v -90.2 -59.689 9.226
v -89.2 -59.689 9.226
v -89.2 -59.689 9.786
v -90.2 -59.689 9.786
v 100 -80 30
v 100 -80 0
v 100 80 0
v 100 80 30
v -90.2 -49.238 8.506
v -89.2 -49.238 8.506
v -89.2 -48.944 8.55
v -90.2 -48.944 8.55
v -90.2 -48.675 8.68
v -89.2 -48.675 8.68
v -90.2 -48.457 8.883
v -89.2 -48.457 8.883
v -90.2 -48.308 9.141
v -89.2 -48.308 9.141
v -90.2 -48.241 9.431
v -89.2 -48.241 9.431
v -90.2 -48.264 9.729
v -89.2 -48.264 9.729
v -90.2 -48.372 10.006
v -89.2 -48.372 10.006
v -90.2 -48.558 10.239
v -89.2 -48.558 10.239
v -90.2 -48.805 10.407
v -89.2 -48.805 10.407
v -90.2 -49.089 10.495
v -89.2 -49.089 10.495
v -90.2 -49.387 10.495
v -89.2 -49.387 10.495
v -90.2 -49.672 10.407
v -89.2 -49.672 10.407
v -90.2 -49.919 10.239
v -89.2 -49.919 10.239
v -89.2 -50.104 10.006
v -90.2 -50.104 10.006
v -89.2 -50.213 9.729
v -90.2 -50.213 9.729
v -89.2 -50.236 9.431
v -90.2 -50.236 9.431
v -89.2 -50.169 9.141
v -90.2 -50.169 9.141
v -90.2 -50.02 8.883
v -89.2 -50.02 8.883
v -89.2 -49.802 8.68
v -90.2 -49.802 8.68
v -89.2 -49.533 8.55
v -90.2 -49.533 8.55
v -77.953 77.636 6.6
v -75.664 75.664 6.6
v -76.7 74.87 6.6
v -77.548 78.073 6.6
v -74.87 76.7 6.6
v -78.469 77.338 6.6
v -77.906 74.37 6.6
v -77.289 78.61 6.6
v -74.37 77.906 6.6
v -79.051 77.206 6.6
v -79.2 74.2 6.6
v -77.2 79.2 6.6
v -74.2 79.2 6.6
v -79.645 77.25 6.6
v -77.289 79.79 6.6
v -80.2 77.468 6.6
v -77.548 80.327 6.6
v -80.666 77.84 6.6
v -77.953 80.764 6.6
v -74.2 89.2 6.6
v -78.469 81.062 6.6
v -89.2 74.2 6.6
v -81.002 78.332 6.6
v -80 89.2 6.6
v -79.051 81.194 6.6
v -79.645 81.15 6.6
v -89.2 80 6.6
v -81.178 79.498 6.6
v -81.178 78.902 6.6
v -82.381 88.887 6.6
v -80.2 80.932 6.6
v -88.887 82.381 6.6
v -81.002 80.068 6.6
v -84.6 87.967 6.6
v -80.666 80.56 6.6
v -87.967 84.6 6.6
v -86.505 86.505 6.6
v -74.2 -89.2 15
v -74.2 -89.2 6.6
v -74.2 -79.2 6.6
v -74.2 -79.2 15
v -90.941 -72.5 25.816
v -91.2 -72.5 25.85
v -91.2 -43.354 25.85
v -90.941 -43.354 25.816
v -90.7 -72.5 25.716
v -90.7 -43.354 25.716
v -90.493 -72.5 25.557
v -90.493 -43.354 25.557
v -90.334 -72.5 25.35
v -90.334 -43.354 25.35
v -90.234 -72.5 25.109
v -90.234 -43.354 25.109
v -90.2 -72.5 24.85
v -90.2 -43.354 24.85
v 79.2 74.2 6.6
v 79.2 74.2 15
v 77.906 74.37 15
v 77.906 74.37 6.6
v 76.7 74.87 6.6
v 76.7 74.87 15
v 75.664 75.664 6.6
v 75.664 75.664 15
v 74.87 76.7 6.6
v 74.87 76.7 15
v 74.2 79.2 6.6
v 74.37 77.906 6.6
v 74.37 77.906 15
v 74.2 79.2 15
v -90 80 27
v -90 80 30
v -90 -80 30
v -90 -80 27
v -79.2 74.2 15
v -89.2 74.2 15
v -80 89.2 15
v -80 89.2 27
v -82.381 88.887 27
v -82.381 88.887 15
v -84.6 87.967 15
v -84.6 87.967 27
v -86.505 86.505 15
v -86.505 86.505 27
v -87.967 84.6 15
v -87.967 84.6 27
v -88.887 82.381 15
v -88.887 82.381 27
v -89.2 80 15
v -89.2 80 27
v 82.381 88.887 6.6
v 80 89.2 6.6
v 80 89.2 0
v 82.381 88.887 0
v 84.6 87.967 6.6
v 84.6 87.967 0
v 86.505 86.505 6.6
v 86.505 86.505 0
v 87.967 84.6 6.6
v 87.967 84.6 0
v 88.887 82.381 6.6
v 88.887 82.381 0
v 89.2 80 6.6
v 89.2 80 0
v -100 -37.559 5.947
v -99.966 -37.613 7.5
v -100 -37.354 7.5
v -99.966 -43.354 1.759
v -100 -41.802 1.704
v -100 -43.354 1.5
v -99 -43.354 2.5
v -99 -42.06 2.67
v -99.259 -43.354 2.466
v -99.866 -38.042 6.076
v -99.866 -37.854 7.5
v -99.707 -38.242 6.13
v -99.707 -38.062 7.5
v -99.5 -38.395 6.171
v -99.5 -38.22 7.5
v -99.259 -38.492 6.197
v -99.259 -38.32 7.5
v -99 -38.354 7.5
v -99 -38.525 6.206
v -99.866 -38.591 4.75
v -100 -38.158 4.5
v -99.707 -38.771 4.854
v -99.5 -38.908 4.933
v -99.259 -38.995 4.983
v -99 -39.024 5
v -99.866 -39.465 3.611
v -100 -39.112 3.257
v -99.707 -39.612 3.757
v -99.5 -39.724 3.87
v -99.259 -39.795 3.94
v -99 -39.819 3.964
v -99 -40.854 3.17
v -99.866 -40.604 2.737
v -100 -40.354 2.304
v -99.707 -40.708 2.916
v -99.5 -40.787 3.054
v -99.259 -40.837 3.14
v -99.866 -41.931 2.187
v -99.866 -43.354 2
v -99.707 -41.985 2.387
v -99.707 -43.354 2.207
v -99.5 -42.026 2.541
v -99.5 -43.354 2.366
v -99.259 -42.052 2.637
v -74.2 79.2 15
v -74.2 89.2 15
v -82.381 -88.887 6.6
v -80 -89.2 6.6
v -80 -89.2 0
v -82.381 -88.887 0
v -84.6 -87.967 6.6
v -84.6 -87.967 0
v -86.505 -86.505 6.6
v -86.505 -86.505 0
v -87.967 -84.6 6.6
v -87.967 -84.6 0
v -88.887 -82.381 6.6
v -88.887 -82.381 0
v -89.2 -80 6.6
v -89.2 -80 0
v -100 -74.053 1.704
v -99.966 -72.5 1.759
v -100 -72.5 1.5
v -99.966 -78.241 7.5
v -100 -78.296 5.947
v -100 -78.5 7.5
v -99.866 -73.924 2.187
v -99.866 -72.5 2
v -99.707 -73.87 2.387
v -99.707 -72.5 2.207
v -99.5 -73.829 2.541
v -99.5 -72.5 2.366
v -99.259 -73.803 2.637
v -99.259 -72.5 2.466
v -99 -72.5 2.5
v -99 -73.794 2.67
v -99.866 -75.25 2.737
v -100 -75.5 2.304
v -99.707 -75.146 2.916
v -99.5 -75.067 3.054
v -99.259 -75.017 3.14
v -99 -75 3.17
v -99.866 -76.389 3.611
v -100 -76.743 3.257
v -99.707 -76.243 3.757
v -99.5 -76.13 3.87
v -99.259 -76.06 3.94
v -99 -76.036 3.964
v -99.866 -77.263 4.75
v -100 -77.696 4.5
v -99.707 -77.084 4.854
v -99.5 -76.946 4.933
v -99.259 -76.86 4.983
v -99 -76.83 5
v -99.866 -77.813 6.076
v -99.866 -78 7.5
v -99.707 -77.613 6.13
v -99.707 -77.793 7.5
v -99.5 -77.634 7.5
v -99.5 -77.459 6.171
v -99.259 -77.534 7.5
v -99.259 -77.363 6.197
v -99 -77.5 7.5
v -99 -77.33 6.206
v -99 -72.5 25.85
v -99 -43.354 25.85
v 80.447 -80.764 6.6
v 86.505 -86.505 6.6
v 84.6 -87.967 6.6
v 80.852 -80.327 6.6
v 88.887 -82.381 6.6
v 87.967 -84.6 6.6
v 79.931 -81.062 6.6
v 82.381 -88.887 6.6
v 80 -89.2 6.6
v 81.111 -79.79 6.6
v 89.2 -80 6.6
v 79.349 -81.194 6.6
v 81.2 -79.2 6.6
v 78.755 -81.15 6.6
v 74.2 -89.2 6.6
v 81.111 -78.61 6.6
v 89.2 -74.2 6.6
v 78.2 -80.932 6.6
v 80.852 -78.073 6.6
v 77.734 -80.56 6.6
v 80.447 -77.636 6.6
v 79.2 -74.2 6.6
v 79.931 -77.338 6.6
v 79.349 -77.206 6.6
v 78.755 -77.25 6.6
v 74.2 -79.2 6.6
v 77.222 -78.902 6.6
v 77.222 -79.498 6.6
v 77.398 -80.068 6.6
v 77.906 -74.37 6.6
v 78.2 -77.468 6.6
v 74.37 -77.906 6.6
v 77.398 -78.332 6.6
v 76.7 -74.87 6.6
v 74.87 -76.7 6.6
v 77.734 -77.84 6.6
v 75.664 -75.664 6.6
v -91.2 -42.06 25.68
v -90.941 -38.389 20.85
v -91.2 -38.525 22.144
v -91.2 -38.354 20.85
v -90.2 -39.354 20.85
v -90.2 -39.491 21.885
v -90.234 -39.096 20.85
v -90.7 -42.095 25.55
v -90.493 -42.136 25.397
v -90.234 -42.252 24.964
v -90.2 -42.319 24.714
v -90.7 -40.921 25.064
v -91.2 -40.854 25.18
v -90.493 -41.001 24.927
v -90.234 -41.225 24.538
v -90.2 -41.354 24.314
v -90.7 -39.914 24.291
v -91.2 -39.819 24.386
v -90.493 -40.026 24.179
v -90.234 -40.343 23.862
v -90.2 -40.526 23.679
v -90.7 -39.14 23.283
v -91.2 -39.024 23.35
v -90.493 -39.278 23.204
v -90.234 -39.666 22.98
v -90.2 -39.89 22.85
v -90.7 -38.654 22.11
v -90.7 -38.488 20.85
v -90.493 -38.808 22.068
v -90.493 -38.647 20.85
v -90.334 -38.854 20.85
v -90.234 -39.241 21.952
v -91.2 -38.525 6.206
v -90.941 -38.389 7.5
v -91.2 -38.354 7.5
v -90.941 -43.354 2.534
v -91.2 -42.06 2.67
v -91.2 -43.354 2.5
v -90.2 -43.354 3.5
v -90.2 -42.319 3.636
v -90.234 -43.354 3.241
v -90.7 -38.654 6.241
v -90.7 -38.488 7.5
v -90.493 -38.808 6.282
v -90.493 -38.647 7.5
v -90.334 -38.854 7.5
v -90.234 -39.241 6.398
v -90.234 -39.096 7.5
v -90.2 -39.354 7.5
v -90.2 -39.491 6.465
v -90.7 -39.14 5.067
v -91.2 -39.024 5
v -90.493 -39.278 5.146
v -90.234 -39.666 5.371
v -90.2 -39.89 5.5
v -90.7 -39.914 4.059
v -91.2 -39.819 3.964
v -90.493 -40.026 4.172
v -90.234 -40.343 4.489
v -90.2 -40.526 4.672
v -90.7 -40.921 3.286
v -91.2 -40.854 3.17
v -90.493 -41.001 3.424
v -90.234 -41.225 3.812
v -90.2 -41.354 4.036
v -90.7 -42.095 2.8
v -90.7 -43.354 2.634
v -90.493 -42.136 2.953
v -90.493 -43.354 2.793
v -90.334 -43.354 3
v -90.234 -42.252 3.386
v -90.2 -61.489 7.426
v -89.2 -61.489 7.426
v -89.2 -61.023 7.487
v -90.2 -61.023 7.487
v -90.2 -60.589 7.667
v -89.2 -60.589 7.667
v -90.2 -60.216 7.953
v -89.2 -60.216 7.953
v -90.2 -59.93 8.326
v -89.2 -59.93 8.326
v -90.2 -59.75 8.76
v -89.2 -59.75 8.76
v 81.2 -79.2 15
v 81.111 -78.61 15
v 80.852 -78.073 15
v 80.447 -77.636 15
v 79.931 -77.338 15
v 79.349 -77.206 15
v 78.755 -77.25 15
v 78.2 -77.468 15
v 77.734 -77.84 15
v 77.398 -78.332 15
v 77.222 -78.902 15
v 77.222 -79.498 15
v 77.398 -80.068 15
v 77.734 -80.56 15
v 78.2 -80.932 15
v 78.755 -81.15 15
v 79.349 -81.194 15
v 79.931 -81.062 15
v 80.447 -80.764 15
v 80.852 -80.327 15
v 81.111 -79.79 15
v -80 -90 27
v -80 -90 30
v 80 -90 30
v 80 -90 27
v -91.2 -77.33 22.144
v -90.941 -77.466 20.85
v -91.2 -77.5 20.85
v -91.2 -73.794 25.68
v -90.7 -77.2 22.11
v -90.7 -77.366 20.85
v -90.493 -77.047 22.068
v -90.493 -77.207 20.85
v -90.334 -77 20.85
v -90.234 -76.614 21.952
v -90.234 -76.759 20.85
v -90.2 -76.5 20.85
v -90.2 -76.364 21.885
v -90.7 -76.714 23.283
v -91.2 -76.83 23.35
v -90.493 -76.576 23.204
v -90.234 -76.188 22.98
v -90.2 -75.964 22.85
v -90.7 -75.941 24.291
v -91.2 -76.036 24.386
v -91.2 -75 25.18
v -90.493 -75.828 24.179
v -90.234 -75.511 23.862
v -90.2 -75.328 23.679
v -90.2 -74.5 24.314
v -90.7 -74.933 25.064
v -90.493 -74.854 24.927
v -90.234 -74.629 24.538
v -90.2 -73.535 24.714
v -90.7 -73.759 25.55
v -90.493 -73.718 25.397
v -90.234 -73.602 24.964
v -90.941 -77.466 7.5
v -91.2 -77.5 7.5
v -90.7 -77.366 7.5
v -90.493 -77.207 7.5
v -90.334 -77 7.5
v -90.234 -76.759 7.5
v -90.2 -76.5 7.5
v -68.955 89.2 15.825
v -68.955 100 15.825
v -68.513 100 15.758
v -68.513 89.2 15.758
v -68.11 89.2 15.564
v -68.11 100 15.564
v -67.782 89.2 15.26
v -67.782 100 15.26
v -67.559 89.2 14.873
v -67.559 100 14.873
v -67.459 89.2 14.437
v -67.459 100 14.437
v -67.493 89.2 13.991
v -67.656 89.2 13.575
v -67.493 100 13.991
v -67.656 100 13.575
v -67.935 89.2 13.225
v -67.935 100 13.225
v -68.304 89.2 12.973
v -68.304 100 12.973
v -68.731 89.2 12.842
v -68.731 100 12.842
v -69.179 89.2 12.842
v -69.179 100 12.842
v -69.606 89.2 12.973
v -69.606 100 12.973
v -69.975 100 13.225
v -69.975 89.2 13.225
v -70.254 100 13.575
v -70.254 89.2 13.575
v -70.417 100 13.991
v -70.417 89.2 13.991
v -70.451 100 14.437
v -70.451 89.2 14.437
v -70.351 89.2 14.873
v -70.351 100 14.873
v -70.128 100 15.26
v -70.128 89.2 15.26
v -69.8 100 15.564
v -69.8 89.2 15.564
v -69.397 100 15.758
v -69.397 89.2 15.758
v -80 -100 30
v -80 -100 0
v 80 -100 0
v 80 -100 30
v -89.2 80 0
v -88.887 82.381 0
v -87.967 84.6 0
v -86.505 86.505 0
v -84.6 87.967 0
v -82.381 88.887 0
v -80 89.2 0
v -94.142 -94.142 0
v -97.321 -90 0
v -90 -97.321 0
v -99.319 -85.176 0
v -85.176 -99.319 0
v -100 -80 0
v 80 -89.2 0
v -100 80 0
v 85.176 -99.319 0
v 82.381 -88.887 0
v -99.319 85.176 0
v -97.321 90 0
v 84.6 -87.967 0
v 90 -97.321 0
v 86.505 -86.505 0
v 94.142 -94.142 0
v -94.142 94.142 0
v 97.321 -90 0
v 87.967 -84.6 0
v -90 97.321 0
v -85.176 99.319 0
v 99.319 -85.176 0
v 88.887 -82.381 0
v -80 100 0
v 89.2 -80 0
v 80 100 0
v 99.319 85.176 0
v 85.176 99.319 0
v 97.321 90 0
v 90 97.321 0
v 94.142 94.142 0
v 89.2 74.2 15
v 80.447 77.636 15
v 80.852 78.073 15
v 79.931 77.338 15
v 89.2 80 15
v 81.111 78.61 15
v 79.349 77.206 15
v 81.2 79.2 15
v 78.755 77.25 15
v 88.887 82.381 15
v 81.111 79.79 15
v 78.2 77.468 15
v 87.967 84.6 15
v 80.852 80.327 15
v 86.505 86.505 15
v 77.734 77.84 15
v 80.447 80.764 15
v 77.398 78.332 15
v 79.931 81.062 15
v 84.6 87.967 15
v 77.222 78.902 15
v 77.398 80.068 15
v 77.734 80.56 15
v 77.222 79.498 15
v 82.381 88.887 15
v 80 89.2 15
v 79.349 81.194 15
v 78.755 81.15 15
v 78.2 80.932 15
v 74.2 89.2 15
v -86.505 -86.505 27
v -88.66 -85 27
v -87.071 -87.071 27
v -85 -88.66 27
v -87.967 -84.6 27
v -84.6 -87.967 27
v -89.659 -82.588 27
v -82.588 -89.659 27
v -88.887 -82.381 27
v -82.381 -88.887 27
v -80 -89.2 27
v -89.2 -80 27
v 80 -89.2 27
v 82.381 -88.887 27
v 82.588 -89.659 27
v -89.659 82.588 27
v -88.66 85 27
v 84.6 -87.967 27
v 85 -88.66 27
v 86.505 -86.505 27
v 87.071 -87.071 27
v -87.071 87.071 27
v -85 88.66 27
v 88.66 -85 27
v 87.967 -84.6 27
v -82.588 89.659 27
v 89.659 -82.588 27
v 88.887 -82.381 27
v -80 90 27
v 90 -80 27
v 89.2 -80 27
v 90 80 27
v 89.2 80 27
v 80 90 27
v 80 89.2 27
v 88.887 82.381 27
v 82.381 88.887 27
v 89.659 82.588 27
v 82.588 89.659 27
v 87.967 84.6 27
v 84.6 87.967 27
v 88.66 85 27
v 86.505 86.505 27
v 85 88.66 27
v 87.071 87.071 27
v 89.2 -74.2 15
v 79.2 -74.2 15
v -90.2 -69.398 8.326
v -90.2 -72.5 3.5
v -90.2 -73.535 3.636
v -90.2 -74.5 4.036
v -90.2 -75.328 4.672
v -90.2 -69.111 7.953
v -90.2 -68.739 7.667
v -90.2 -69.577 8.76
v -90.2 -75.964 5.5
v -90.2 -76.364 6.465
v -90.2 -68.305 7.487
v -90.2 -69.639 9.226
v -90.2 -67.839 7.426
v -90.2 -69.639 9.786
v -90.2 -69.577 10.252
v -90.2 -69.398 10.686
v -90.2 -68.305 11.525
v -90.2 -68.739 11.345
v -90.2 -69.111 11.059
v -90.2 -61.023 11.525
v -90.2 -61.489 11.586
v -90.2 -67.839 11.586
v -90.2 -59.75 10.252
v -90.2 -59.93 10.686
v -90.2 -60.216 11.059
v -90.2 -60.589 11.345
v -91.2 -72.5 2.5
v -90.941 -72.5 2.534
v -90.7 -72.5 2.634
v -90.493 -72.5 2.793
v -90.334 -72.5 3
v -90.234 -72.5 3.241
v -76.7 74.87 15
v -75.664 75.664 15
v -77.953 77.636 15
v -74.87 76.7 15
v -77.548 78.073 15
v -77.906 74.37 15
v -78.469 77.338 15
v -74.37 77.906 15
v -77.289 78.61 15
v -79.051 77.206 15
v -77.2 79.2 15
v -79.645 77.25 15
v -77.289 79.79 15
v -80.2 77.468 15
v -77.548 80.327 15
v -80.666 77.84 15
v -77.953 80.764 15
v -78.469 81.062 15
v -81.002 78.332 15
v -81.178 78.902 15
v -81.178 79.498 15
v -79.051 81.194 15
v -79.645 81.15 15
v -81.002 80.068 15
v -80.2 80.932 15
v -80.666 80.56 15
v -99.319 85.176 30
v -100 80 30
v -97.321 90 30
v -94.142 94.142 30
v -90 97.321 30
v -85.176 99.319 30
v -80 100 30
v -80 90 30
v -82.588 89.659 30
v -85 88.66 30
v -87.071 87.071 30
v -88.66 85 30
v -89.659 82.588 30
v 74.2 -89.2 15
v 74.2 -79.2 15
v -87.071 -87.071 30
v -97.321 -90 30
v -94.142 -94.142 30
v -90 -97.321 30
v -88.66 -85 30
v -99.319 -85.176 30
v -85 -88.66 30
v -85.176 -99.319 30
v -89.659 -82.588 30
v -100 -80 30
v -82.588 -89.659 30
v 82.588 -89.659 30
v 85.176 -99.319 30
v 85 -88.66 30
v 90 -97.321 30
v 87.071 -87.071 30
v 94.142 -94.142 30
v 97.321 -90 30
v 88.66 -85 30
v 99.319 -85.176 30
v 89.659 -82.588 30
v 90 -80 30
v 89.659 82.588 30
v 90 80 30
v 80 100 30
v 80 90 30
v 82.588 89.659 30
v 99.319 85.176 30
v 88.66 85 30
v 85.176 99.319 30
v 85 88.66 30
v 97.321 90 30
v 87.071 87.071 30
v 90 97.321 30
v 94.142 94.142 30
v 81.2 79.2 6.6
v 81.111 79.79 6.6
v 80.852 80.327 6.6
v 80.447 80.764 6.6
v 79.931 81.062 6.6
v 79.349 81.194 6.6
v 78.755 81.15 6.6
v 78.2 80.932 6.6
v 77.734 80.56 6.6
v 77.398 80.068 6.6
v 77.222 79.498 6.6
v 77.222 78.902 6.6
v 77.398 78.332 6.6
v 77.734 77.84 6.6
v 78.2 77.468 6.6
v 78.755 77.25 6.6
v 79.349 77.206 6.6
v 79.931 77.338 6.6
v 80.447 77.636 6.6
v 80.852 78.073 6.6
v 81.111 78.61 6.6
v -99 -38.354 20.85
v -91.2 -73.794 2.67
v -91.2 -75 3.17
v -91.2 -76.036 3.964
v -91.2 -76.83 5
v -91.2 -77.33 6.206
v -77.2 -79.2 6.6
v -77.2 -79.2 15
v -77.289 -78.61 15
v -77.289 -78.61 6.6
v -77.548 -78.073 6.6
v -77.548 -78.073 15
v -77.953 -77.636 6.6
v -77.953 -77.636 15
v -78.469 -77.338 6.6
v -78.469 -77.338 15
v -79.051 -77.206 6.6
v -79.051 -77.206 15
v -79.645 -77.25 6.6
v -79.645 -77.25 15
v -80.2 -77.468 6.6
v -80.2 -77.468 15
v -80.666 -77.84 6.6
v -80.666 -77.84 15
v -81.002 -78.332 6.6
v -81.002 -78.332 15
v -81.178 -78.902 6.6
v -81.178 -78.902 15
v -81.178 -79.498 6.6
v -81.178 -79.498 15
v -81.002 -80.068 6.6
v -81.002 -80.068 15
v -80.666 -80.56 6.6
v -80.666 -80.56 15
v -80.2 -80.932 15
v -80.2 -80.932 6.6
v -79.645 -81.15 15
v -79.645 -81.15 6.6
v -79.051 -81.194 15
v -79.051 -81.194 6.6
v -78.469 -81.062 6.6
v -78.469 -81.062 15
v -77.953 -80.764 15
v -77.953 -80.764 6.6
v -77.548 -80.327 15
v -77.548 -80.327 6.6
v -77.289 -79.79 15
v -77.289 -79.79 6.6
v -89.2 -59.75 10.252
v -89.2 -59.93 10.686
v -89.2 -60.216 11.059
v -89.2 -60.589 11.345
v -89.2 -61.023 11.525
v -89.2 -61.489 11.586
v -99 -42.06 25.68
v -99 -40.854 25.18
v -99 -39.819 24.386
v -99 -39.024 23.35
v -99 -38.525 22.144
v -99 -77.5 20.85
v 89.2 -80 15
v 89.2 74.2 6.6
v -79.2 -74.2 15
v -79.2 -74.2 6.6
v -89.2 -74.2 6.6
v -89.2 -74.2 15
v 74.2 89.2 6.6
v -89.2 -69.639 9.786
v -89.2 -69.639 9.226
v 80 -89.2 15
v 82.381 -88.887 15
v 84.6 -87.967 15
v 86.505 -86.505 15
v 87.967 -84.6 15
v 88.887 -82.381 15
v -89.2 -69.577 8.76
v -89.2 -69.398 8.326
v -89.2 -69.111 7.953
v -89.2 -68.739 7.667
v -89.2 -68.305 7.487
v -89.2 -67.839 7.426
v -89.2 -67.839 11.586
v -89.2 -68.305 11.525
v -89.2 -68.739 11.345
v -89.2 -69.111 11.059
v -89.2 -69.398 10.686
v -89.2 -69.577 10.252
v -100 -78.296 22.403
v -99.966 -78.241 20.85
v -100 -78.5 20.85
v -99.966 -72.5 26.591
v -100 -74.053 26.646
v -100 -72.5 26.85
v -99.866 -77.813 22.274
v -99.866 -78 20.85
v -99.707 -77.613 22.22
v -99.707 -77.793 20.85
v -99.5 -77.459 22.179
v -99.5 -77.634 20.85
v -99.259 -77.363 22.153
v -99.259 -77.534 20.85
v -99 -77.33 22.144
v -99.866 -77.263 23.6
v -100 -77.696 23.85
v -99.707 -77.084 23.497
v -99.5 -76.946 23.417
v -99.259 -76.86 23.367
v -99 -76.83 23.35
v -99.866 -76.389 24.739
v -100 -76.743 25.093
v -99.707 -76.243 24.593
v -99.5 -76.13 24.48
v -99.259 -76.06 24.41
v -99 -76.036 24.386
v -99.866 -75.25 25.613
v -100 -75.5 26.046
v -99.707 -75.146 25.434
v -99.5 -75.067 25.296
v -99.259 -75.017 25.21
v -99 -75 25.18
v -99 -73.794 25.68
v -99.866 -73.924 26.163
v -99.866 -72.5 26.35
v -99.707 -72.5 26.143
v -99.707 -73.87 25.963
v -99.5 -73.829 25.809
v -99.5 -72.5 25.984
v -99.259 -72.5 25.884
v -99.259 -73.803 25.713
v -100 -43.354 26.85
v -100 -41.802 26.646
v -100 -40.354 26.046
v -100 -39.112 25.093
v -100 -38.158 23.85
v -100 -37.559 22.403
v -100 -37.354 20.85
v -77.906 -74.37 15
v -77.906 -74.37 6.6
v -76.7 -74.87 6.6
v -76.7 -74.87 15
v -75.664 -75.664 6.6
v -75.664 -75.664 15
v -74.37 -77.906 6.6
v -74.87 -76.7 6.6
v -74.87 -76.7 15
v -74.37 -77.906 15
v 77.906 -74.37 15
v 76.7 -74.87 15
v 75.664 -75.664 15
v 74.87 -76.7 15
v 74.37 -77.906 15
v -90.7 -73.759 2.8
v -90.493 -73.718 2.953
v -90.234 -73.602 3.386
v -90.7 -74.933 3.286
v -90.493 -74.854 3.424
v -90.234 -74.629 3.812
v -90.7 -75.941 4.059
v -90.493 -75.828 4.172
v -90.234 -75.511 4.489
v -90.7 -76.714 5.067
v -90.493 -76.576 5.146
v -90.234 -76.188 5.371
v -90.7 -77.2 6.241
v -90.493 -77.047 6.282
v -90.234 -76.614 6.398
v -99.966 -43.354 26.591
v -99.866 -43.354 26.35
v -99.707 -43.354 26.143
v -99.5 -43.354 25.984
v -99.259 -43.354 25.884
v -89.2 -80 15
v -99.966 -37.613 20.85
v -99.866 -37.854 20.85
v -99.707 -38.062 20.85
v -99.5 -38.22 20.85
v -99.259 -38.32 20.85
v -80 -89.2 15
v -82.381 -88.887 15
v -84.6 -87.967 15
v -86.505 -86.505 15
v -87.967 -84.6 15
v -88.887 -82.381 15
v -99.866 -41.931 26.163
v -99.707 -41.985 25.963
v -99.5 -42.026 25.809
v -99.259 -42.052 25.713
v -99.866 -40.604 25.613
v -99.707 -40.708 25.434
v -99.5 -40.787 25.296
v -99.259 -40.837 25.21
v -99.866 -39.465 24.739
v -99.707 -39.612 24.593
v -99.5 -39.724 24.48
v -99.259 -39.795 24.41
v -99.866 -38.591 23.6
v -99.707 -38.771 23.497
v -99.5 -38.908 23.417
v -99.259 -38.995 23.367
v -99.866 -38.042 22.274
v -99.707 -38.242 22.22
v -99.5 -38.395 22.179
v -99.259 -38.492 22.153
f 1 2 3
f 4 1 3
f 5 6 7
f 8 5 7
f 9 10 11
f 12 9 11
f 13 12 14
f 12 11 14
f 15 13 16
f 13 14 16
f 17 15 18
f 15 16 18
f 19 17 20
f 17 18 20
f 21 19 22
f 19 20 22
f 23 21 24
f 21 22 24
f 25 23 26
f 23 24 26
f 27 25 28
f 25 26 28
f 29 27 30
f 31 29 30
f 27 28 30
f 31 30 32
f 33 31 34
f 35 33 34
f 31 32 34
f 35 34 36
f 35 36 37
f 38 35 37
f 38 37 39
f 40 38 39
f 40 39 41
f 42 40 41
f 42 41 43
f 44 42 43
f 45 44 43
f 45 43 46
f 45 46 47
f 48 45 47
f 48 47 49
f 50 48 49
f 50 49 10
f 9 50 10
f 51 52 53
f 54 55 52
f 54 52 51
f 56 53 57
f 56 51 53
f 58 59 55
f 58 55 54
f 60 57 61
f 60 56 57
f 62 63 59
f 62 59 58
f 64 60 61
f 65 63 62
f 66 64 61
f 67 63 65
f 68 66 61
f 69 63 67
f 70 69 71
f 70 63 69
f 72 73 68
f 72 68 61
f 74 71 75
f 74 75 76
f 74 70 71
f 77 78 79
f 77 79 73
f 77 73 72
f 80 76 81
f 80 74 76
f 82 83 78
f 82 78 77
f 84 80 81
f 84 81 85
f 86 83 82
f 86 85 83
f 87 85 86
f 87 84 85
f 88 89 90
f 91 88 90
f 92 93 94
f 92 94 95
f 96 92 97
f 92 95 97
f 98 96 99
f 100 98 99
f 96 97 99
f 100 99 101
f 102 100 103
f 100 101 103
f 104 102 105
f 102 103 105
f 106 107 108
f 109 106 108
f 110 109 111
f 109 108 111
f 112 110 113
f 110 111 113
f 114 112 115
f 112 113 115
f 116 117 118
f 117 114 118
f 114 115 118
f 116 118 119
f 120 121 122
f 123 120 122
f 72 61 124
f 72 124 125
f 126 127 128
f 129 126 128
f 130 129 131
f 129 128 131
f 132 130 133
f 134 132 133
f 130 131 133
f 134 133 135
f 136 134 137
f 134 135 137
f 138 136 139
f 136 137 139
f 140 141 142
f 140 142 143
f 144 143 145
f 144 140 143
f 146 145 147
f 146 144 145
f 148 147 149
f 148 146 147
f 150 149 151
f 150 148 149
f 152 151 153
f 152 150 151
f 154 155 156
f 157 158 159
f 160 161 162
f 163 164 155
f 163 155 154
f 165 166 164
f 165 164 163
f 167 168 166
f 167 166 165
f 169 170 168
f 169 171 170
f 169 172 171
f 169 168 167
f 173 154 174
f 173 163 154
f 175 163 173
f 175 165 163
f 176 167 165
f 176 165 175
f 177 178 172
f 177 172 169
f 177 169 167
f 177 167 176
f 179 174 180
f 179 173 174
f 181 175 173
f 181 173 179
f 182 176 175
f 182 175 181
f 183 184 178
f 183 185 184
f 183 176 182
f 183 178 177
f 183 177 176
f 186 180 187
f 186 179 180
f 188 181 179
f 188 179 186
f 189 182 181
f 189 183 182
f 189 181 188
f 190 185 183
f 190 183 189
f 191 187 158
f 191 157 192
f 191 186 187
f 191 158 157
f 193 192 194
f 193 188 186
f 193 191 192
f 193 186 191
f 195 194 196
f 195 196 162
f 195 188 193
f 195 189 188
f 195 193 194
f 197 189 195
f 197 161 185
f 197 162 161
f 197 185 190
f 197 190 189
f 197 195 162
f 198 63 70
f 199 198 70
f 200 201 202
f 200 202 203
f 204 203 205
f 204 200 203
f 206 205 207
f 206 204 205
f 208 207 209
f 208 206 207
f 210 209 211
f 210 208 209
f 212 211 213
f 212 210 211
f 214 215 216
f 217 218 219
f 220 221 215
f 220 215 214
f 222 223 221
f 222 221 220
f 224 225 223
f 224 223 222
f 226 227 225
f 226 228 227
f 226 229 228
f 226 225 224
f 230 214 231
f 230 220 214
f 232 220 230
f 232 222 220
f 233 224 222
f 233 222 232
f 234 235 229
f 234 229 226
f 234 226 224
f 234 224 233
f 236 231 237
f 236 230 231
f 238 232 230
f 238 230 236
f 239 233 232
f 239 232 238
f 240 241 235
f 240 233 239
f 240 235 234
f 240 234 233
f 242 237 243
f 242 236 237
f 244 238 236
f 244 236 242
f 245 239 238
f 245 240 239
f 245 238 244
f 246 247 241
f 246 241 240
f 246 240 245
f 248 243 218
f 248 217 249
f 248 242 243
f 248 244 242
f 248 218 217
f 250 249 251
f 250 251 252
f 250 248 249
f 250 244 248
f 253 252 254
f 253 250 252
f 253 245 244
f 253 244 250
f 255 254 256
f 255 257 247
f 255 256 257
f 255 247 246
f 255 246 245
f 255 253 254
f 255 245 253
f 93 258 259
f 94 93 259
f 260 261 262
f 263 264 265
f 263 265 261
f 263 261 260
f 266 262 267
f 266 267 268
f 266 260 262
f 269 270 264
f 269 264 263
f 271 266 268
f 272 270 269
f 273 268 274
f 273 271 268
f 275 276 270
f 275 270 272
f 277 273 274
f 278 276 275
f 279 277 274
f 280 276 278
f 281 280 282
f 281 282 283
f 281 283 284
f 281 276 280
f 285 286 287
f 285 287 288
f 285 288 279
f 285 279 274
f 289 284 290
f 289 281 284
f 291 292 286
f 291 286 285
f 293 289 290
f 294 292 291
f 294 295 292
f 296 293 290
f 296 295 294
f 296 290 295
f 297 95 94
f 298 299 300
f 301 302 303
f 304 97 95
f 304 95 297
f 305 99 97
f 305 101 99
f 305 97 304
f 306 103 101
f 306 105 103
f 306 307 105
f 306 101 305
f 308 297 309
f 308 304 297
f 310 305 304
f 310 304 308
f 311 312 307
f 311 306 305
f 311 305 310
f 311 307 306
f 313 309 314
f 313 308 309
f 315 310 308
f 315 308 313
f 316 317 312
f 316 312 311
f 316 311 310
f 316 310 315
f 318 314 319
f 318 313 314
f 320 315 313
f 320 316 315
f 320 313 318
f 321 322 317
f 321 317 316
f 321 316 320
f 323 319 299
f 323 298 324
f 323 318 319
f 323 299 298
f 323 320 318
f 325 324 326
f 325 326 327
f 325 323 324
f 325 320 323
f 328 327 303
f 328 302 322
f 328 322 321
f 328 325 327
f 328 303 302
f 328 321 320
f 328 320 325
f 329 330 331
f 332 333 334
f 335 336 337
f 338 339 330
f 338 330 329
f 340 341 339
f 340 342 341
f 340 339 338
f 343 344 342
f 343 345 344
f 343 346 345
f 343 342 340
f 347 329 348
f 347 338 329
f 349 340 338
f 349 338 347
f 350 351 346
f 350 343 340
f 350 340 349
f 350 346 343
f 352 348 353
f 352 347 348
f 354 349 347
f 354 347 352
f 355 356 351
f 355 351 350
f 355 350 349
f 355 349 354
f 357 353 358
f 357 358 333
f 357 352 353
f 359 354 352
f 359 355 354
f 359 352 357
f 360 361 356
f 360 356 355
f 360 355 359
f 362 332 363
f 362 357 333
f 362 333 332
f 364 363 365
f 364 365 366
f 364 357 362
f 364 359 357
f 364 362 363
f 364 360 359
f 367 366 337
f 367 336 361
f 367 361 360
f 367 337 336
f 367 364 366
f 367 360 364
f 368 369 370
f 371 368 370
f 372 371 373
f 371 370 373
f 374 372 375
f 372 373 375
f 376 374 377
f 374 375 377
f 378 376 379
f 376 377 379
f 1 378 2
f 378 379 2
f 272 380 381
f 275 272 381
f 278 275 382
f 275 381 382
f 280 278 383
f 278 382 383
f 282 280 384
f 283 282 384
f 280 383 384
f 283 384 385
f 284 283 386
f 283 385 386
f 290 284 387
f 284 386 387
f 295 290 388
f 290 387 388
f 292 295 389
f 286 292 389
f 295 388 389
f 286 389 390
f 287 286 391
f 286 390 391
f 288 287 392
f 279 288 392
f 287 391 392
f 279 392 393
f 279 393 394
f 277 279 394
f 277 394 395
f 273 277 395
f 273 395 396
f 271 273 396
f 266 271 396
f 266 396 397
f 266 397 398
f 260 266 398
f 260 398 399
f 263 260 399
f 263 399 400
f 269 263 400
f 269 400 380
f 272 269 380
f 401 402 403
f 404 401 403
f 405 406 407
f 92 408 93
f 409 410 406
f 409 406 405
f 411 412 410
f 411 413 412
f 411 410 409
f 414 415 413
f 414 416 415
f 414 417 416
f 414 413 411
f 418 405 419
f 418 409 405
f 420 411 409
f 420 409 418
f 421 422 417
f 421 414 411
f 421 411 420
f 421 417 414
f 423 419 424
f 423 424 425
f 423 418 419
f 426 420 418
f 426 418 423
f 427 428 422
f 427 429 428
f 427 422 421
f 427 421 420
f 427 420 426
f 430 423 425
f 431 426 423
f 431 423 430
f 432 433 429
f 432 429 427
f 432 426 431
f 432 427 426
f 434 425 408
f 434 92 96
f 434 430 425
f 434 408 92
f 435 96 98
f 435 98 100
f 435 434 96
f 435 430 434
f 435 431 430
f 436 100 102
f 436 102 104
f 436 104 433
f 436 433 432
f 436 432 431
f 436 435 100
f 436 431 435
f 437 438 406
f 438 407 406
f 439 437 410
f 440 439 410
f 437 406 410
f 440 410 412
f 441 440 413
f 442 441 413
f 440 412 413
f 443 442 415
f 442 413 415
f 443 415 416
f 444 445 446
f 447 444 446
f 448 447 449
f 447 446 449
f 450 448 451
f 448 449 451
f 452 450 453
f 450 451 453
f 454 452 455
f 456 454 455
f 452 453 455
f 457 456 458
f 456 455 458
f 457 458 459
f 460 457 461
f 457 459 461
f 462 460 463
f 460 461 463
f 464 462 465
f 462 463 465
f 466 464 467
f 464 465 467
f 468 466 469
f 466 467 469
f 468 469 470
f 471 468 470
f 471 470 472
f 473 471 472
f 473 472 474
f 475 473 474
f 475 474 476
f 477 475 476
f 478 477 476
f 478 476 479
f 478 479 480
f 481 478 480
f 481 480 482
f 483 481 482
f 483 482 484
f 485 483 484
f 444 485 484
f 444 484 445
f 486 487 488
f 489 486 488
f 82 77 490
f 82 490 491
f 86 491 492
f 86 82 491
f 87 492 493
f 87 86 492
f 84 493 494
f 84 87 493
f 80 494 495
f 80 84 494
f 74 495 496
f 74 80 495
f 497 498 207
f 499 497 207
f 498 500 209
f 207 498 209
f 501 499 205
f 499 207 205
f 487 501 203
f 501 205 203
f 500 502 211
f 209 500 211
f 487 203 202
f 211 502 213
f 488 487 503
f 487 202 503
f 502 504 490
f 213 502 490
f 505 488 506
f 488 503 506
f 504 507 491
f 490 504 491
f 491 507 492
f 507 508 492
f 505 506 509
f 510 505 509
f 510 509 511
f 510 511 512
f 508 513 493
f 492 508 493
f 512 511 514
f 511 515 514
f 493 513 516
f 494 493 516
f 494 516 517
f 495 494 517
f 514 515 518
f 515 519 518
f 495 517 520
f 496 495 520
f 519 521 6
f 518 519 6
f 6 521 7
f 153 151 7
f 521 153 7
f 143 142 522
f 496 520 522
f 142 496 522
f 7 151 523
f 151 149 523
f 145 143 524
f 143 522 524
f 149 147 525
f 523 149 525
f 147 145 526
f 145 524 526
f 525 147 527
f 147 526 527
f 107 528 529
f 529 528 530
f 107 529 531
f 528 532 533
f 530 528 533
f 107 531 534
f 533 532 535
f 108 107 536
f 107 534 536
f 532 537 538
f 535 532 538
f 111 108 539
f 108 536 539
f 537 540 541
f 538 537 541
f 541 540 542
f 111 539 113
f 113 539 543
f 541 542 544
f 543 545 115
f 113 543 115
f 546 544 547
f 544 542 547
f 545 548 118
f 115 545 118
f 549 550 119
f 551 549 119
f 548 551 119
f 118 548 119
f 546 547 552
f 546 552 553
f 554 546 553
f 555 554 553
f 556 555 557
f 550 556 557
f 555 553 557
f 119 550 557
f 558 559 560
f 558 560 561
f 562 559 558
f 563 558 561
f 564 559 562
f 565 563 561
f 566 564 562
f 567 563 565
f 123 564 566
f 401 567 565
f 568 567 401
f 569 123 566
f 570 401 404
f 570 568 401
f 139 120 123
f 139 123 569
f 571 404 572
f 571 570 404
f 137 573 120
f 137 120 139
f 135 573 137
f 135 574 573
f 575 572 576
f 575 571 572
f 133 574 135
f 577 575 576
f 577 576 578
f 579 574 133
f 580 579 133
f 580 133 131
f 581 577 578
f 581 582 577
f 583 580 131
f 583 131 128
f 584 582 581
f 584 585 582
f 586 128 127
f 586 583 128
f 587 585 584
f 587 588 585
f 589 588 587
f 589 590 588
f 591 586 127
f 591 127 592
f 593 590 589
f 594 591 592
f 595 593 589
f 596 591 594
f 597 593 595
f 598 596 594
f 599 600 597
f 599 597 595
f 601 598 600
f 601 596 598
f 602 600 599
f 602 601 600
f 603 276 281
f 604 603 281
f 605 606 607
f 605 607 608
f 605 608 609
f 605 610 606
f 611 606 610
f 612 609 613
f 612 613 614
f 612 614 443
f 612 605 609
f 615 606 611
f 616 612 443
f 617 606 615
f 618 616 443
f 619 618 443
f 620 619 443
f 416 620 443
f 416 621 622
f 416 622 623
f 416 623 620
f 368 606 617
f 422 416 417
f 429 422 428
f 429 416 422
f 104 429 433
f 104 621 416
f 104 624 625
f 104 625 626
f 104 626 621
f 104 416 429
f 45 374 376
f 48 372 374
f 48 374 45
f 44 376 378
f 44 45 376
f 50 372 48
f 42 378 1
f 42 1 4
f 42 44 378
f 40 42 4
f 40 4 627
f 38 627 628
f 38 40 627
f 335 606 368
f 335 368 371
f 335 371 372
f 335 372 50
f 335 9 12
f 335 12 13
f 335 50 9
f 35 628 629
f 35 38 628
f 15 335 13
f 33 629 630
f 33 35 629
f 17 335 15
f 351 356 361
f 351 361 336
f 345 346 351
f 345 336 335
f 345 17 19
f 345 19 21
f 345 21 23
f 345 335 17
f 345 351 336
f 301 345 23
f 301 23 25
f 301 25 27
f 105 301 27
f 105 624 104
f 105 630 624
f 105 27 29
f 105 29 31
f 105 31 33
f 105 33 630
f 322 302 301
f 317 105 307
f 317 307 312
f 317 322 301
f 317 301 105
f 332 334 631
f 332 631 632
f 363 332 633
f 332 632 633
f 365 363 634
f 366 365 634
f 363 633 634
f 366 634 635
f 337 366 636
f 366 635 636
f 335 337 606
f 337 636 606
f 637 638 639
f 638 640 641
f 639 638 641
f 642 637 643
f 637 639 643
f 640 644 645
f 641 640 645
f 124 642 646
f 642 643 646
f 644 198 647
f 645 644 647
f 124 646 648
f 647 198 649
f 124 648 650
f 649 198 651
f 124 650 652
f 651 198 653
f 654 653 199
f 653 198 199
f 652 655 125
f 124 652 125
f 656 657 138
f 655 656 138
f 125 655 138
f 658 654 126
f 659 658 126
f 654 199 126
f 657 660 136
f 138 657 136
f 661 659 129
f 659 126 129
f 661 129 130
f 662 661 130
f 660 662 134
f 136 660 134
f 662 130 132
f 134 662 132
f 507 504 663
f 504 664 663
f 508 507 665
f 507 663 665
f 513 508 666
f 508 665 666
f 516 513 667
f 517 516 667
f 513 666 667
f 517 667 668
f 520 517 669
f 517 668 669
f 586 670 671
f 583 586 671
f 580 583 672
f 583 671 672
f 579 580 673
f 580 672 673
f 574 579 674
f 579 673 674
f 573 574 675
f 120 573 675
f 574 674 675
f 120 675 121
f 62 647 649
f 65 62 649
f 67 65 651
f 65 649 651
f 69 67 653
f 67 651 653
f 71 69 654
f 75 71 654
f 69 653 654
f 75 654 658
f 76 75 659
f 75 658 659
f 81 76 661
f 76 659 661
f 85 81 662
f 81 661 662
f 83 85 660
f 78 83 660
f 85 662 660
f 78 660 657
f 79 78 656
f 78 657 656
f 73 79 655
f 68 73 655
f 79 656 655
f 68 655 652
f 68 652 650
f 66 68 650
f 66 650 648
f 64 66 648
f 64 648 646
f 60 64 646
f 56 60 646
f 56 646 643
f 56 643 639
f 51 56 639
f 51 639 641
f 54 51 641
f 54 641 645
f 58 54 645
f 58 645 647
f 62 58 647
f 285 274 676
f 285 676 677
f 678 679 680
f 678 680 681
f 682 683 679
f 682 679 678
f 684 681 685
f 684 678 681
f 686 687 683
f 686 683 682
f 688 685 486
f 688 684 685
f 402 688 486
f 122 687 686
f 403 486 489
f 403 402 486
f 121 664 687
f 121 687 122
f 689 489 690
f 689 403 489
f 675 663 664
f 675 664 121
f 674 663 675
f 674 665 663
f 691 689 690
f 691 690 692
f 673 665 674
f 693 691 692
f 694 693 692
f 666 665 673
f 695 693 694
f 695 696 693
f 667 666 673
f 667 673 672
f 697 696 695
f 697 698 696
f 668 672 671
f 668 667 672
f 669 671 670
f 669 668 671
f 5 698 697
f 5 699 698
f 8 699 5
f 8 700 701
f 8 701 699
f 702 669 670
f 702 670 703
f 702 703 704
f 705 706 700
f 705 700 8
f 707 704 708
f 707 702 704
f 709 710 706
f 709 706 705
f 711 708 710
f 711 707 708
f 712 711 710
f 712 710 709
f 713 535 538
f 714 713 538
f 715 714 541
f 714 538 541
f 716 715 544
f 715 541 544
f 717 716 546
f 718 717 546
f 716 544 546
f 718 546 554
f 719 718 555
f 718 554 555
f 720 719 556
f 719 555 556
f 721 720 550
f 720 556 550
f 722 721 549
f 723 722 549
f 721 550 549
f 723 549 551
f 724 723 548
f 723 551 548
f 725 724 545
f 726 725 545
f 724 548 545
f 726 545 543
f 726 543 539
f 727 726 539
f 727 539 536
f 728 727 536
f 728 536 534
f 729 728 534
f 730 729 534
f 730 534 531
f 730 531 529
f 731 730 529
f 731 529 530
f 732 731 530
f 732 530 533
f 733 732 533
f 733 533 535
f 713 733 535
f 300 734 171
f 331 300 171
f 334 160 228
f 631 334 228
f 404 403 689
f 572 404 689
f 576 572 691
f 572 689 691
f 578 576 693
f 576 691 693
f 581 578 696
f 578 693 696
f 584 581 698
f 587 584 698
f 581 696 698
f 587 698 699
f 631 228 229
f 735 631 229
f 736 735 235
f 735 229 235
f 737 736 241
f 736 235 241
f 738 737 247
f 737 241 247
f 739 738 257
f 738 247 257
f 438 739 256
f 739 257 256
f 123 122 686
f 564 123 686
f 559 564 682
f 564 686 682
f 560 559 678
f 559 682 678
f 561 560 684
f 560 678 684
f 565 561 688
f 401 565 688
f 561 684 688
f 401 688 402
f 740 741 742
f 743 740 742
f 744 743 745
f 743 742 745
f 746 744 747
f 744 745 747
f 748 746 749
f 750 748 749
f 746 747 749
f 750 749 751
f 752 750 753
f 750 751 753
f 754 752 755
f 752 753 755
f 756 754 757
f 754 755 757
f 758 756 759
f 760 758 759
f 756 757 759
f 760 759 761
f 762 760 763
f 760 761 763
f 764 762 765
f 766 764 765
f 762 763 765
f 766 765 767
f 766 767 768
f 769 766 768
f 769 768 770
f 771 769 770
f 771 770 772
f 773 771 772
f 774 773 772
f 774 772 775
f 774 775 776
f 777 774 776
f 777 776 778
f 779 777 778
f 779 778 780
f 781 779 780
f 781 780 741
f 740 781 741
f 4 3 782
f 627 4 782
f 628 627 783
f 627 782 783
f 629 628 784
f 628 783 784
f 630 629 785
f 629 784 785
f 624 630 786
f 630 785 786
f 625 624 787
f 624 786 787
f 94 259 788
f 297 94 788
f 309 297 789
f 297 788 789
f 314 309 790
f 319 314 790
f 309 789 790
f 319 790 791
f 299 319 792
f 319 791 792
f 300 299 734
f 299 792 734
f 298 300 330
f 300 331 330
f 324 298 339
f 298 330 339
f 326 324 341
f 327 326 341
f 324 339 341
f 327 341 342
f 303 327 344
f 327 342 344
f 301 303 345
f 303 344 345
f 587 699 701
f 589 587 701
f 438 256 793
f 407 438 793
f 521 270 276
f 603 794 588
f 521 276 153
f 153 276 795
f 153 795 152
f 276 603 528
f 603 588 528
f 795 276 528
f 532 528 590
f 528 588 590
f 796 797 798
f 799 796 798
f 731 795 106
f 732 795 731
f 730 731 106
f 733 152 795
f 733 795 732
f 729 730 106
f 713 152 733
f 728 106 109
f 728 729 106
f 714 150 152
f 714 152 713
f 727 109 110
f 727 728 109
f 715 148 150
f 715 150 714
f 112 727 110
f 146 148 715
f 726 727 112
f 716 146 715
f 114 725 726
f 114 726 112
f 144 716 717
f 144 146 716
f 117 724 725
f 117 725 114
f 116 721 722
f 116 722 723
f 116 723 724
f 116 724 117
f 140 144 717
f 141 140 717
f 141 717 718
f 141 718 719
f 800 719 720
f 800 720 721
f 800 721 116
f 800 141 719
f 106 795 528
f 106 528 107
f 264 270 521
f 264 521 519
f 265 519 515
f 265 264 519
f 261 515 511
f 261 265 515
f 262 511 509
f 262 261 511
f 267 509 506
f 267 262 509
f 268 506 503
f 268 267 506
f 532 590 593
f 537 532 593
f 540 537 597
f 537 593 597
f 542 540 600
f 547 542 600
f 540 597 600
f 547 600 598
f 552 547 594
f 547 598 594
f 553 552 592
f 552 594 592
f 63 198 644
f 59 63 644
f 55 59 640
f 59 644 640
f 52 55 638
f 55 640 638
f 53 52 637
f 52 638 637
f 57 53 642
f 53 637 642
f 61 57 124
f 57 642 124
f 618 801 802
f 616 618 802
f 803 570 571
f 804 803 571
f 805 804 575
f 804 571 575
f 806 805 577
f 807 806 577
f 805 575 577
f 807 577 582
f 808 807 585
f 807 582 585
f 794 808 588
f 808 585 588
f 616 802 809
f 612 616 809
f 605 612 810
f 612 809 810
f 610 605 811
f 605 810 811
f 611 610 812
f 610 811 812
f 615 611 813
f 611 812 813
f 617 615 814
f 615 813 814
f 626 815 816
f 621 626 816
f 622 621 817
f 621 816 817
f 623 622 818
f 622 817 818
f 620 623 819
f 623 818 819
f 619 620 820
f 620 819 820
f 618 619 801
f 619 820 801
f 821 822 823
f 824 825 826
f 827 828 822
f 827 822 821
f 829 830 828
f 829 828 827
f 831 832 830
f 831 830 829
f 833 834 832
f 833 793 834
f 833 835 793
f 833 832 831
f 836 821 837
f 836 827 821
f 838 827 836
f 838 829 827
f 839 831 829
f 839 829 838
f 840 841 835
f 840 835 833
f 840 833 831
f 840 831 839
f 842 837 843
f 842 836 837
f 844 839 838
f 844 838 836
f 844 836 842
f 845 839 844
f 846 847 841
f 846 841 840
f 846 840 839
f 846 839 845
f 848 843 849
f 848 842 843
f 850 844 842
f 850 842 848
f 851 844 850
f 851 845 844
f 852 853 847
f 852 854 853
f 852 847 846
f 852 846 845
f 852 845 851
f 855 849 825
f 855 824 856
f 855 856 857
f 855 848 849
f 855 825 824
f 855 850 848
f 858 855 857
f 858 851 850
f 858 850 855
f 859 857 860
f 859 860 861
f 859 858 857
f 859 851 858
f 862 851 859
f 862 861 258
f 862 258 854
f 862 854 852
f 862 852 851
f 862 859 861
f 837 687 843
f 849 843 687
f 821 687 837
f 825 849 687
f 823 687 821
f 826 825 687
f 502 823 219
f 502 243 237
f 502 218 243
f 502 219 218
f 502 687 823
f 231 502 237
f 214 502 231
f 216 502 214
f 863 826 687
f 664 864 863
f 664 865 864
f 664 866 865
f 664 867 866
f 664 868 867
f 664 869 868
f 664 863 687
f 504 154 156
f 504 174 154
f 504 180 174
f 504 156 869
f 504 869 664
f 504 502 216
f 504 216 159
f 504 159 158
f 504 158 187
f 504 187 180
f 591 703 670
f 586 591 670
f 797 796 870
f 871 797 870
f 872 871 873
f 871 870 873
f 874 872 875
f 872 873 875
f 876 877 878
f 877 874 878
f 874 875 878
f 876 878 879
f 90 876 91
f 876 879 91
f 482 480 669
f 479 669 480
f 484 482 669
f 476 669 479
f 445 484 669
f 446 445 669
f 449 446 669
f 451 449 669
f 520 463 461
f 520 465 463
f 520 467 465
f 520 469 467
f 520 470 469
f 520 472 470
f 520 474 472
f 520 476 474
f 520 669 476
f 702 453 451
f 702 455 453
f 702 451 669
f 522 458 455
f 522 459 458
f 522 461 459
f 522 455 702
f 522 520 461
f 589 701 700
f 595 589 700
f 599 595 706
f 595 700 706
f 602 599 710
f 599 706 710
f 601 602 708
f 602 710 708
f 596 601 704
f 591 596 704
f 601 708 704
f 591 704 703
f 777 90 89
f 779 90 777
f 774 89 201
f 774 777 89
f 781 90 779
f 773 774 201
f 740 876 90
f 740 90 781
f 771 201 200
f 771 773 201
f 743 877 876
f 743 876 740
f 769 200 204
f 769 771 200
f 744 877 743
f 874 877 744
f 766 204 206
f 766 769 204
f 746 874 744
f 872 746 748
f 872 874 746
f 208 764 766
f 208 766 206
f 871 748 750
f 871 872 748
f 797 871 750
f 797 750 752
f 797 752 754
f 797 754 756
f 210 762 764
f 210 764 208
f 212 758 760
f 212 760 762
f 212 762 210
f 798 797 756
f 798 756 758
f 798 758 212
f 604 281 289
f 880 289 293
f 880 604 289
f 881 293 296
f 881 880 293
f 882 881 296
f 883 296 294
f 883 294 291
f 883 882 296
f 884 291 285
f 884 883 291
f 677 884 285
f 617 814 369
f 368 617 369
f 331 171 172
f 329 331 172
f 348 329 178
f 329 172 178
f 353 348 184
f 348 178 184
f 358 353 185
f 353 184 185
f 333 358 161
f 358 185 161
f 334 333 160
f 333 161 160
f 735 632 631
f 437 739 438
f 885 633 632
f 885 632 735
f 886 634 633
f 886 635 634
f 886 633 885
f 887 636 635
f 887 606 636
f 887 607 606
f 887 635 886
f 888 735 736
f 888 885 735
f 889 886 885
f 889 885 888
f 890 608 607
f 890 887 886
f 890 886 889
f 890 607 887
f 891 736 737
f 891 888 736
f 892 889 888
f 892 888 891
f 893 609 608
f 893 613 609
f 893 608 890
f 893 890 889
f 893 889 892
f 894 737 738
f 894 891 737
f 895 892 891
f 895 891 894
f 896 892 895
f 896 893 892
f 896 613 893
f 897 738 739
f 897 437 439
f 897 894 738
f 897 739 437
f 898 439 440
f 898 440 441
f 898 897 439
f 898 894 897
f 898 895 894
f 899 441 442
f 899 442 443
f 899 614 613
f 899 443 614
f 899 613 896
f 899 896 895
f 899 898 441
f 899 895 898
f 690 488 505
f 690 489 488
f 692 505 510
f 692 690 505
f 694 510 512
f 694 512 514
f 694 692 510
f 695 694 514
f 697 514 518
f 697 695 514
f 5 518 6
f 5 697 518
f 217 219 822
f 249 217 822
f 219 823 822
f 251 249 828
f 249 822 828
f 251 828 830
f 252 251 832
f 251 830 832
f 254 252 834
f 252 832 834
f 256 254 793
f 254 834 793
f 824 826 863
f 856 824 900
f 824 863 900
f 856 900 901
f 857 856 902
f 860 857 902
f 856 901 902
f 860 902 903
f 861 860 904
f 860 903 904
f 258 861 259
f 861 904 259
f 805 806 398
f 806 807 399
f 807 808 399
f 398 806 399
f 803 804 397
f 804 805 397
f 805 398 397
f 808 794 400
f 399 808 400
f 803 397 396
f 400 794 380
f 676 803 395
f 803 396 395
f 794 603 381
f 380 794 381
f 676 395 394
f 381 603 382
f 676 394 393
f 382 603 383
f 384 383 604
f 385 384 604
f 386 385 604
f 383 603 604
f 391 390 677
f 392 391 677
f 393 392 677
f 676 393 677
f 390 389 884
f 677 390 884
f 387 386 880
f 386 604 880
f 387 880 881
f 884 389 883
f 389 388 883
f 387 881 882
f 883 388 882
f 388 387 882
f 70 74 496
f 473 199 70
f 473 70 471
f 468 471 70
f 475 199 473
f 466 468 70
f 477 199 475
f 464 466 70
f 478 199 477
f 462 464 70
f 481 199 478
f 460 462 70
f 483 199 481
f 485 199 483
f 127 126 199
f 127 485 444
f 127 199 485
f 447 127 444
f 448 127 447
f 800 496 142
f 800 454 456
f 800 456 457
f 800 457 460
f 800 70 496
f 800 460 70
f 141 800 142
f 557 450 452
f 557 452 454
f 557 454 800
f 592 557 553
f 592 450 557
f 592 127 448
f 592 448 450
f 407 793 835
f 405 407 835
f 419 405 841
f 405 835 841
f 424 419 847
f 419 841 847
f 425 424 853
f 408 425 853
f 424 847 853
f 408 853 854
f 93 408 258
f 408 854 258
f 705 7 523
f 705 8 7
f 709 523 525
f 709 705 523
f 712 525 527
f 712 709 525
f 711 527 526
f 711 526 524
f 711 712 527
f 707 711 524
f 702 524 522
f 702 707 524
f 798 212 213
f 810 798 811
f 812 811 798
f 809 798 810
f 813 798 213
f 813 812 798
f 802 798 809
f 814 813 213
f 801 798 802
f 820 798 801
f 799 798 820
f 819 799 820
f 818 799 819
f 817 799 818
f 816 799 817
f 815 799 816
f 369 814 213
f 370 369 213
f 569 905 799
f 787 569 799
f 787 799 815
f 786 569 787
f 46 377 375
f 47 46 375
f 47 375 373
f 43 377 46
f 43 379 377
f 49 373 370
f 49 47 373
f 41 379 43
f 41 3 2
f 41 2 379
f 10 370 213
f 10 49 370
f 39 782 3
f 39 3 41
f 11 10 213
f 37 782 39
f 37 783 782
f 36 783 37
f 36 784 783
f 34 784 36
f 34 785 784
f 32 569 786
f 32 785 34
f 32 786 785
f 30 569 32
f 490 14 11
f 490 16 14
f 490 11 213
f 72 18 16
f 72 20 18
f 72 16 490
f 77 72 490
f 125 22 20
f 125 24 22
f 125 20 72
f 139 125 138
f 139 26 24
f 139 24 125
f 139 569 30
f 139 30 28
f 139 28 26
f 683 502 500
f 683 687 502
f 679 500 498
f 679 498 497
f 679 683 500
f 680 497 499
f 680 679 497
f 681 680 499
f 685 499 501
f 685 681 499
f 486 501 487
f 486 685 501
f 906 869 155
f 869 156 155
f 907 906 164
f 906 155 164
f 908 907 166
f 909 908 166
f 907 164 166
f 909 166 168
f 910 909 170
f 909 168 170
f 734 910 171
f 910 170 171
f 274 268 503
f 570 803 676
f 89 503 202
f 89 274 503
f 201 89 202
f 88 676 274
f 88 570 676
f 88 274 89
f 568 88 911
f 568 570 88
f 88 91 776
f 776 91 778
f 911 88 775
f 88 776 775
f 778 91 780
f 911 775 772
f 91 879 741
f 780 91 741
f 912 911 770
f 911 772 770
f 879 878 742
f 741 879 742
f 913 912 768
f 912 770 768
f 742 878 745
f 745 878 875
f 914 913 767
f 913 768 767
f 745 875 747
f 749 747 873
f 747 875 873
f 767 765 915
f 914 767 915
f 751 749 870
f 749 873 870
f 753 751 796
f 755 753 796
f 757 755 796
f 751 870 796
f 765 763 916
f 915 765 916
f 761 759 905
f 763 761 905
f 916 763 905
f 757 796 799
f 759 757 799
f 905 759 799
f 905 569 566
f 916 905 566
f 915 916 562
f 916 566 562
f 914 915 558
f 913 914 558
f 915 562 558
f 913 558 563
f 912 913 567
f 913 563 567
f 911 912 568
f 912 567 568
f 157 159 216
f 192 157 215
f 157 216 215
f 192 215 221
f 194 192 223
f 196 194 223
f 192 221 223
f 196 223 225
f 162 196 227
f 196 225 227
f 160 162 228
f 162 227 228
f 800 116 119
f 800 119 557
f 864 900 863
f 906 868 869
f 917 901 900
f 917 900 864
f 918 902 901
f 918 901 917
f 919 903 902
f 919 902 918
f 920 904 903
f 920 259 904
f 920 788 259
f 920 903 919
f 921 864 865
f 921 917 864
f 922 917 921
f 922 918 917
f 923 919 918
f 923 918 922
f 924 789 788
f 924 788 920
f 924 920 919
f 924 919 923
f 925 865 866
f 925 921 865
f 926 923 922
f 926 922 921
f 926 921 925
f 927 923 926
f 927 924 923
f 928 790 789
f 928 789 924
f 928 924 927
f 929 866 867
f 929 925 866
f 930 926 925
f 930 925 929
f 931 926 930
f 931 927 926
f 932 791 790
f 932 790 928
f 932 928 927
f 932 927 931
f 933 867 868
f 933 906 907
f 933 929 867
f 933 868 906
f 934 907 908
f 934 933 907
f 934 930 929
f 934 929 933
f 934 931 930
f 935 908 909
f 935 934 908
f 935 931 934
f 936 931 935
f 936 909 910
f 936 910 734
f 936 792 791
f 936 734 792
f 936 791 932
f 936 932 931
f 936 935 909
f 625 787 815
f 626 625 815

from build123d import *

# Parameters (mm, degrees)
SKETCH2_W                = 200
SKETCH2_H                = 200
BOSS_EXTRUDE1_DEPTH      = 30
FILLET1_R                = 20
CUT_EXTRUDE1_DEPTH       = 3
CUT_EXTRUDE2_DEPTH       = 144.975692393
SKETCH6_W                = 15
SKETCH6_H                = 15
BOSS_EXTRUDE4_DEPTH      = 15
FILLET2_R                = 5
F_4_0_4_DIAMETER_HOLE1_D = 4
CUT_EXTRUDE3_START       = -6.6
CUT_EXTRUDE3_DEPTH       = 6.6
CUT_EXTRUDE4_REACH       = 227.61
SKETCH11_R               = 1.5
SKETCH15_R               = 1
CUT_EXTRUDE5_DEPTH       = 217.094053597
CUT_EXTRUDE7_DEPTH       = 9.8
FILLET3_R                = 1


with BuildPart() as part:
    # Sketch2 → Boss-Extrude1 (new body)
    with BuildSketch(Plane.XY):
        Rectangle(SKETCH2_W, SKETCH2_H)
    extrude(amount=BOSS_EXTRUDE1_DEPTH)

    # Fillet1
    fillet1_edges = [part.edges().sort_by_distance(p)[0] for p in [
        (100, -100, 15),
        (-100, -100, 15),
        (-100, 100, 15),
        (100, 100, 15),
    ]]
    fillet(fillet1_edges, radius=FILLET1_R)

    # Sketch3 → Cut-Extrude1 (cut)
    with BuildSketch(Plane.XY.offset(30)):
        with BuildLine():
            Line((-90, 80), (-90, -80))
            ThreePointArc((-90, -80), (-87.071067812, -87.071067812), (-80, -90))
            Line((-80, -90), (80, -90))
            ThreePointArc((80, -90), (87.071067812, -87.071067812), (90, -80))
            Line((90, -80), (90, 80))
            ThreePointArc((90, 80), (87.071067812, 87.071067812), (80, 90))
            Line((80, 90), (-80, 90))
            ThreePointArc((-80, 90), (-87.071067812, 87.071067812), (-90, 80))
        make_face()
    extrude(amount=-CUT_EXTRUDE1_DEPTH, mode=Mode.SUBTRACT)

    # Sketch4 → Cut-Extrude2 (cut, through all)
    with BuildSketch(Plane.XY.offset(27)):
        with BuildLine():
            Line((-89.2, 80), (-89.2, -80))
            ThreePointArc((-89.2, -80), (-86.505382387, -86.505382387), (-80, -89.2))
            Line((-80, -89.2), (80, -89.2))
            ThreePointArc((80, -89.2), (86.505382387, -86.505382387), (89.2, -80))
            Line((89.2, -80), (89.2, 80))
            ThreePointArc((89.2, 80), (86.505382387, 86.505382387), (80, 89.2))
            Line((80, 89.2), (-80, 89.2))
            ThreePointArc((-80, 89.2), (-86.505382387, 86.505382387), (-89.2, 80))
        make_face()
    extrude(amount=-CUT_EXTRUDE2_DEPTH, mode=Mode.SUBTRACT)

    # Sketch6 → Boss-Extrude4 (add)
    with BuildSketch(Plane(origin=(0, 0, 0), x_dir=(-1, 0, 0), z_dir=(0, 0, -1))):
        with Locations((-81.7, -81.7)):
            Rectangle(SKETCH6_W, SKETCH6_H)
        with Locations((-81.7, 81.7)):
            Rectangle(SKETCH6_W, SKETCH6_H)
        with Locations((81.7, 81.7)):
            Rectangle(SKETCH6_W, SKETCH6_H)
        with Locations((81.7, -81.7)):
            Rectangle(SKETCH6_W, SKETCH6_H)
    extrude(amount=-BOSS_EXTRUDE4_DEPTH)

    # Fillet2
    fillet2_edges = [part.edges().sort_by_distance(p)[0] for p in [
        (74.2, 74.2, 7.5),
        (-74.2, 74.2, 7.5),
        (-74.2, -74.2, 7.5),
        (74.2, -74.2, 7.5),
    ]]
    fillet(fillet2_edges, radius=FILLET2_R)

    # Ø4.0 (4) Diameter Hole1 (through all)
    with Locations(Plane(origin=(0, 0, 0), x_dir=(-1, 0, 0), z_dir=(0, 0, -1))):
        with Locations((-79.2, 79.2), (79.2, 79.2), (-79.2, -79.2), (79.2, -79.2)):
            Hole(F_4_0_4_DIAMETER_HOLE1_D / 2)

    # Sketch10 → Cut-Extrude3 (cut)
    with BuildSketch(Plane(origin=(0, 0, 0), x_dir=(-1, 0, 0), z_dir=(0, 0, -1)).offset(CUT_EXTRUDE3_START)):
        with BuildLine():
            Line((89.2, -80), (89.2, 80))
            ThreePointArc((89.2, 80), (86.505382387, 86.505382387), (80, 89.2))
            Line((80, 89.2), (-80, 89.2))
            ThreePointArc((-80, 89.2), (-86.505382387, 86.505382387), (-89.2, 80))
            Line((-89.2, 80), (-89.2, -80))
            ThreePointArc((-89.2, -80), (-86.505382387, -86.505382387), (-80, -89.2))
            Line((-80, -89.2), (80, -89.2))
            ThreePointArc((80, -89.2), (86.505382387, -86.505382387), (89.2, -80))
        make_face()
    extrude(amount=CUT_EXTRUDE3_DEPTH, mode=Mode.SUBTRACT)

    # Sketch11 → Cut-Extrude4 (cut, up to next)
    with BuildSketch(Plane(origin=(0, 100, 0), x_dir=(1, 0, 0), z_dir=(0, 1, 0)), mode=Mode.PRIVATE) as cut_extrude4_sk1:
        with Locations(Location((-68.95500318, -14.324851484, 0), (0, 0, 270))):
            Circle(SKETCH11_R)
    cut_extrude4_tool1 = extrude(cut_extrude4_sk1.sketch, amount=-CUT_EXTRUDE4_REACH, mode=Mode.PRIVATE) & part.part
    add(cut_extrude4_tool1.solids().sort_by_distance((-68.955003, 100, 14.324851))[0], mode=Mode.SUBTRACT)

    # Sketch15 → Cut-Extrude5 (cut, through all)
    with BuildSketch(Plane(origin=(-89.2, 0, 0), x_dir=(0, 0, -1), z_dir=(1, 0, 0))):
        with Locations((-9.506010444, -49.23845191)):
            Circle(SKETCH15_R)
        with BuildLine():
            Line((-9.226010444, -59.688663791), (-9.786010444, -59.688663791))
            ThreePointArc((-9.786010444, -59.688663791), (-11.05880265, -60.215871585), (-11.586010444, -61.488663791))
            Line((-11.586010444, -61.488663791), (-11.586010444, -67.838663791))
            ThreePointArc((-11.586010444, -67.838663791), (-11.05880265, -69.111455997), (-9.786010444, -69.638663791))
            Line((-9.786010444, -69.638663791), (-9.226010444, -69.638663791))
            ThreePointArc((-9.226010444, -69.638663791), (-7.953218238, -69.111455997), (-7.426010444, -67.838663791))
            Line((-7.426010444, -67.838663791), (-7.426010444, -61.488663791))
            ThreePointArc((-7.426010444, -61.488663791), (-7.953218238, -60.215871585), (-9.226010444, -59.688663791))
        make_face()
    extrude(amount=-CUT_EXTRUDE5_DEPTH, mode=Mode.SUBTRACT)

    # Sketch17 → Cut-Extrude7 (cut)
    with BuildSketch(Plane.ZY.offset(100)):
        with BuildLine():
            Line((20.850135553, -38.354466572), (7.5, -38.354466572))
            ThreePointArc((7.5, -38.354466572), (3.964466094, -39.818932666), (2.5, -43.354466572))
            Line((2.5, -43.354466572), (2.5, -72.5))
            ThreePointArc((2.5, -72.5), (3.964466094, -76.035533906), (7.5, -77.5))
            Line((7.5, -77.5), (20.850135553, -77.5))
            ThreePointArc((20.850135553, -77.5), (24.385669459, -76.035533906), (25.850135553, -72.5))
            Line((25.850135553, -72.5), (25.850135553, -43.354466572))
            ThreePointArc((25.850135553, -43.354466572), (24.385669459, -39.818932666), (20.850135553, -38.354466572))
        make_face()
    extrude(amount=-CUT_EXTRUDE7_DEPTH, mode=Mode.SUBTRACT)

    # Fillet3
    fillet3_edges = [part.edges().sort_by_distance(p)[0] for p in [
        (-100, -39.818932666, 3.964466094),
        (-100, -57.927233286, 2.5),
        (-100, -76.035533906, 3.964466094),
        (-100, -77.5, 14.175067777),
        (-100, -76.035533906, 24.385669459),
        (-100, -57.927233286, 25.850135553),
        (-100, -39.818932666, 24.385669459),
        (-100, -38.354466572, 14.175067777),
        (-90.2, -39.818932666, 3.964466094),
        (-90.2, -38.354466572, 14.175067777),
        (-90.2, -39.818932666, 24.385669459),
        (-90.2, -57.927233286, 25.850135553),
        (-90.2, -76.035533906, 24.385669459),
        (-90.2, -77.5, 14.175067777),
        (-90.2, -76.035533906, 3.964466094),
        (-90.2, -57.927233286, 2.5),
    ]]
    fillet(fillet3_edges, radius=FILLET3_R)


solid = part.part
